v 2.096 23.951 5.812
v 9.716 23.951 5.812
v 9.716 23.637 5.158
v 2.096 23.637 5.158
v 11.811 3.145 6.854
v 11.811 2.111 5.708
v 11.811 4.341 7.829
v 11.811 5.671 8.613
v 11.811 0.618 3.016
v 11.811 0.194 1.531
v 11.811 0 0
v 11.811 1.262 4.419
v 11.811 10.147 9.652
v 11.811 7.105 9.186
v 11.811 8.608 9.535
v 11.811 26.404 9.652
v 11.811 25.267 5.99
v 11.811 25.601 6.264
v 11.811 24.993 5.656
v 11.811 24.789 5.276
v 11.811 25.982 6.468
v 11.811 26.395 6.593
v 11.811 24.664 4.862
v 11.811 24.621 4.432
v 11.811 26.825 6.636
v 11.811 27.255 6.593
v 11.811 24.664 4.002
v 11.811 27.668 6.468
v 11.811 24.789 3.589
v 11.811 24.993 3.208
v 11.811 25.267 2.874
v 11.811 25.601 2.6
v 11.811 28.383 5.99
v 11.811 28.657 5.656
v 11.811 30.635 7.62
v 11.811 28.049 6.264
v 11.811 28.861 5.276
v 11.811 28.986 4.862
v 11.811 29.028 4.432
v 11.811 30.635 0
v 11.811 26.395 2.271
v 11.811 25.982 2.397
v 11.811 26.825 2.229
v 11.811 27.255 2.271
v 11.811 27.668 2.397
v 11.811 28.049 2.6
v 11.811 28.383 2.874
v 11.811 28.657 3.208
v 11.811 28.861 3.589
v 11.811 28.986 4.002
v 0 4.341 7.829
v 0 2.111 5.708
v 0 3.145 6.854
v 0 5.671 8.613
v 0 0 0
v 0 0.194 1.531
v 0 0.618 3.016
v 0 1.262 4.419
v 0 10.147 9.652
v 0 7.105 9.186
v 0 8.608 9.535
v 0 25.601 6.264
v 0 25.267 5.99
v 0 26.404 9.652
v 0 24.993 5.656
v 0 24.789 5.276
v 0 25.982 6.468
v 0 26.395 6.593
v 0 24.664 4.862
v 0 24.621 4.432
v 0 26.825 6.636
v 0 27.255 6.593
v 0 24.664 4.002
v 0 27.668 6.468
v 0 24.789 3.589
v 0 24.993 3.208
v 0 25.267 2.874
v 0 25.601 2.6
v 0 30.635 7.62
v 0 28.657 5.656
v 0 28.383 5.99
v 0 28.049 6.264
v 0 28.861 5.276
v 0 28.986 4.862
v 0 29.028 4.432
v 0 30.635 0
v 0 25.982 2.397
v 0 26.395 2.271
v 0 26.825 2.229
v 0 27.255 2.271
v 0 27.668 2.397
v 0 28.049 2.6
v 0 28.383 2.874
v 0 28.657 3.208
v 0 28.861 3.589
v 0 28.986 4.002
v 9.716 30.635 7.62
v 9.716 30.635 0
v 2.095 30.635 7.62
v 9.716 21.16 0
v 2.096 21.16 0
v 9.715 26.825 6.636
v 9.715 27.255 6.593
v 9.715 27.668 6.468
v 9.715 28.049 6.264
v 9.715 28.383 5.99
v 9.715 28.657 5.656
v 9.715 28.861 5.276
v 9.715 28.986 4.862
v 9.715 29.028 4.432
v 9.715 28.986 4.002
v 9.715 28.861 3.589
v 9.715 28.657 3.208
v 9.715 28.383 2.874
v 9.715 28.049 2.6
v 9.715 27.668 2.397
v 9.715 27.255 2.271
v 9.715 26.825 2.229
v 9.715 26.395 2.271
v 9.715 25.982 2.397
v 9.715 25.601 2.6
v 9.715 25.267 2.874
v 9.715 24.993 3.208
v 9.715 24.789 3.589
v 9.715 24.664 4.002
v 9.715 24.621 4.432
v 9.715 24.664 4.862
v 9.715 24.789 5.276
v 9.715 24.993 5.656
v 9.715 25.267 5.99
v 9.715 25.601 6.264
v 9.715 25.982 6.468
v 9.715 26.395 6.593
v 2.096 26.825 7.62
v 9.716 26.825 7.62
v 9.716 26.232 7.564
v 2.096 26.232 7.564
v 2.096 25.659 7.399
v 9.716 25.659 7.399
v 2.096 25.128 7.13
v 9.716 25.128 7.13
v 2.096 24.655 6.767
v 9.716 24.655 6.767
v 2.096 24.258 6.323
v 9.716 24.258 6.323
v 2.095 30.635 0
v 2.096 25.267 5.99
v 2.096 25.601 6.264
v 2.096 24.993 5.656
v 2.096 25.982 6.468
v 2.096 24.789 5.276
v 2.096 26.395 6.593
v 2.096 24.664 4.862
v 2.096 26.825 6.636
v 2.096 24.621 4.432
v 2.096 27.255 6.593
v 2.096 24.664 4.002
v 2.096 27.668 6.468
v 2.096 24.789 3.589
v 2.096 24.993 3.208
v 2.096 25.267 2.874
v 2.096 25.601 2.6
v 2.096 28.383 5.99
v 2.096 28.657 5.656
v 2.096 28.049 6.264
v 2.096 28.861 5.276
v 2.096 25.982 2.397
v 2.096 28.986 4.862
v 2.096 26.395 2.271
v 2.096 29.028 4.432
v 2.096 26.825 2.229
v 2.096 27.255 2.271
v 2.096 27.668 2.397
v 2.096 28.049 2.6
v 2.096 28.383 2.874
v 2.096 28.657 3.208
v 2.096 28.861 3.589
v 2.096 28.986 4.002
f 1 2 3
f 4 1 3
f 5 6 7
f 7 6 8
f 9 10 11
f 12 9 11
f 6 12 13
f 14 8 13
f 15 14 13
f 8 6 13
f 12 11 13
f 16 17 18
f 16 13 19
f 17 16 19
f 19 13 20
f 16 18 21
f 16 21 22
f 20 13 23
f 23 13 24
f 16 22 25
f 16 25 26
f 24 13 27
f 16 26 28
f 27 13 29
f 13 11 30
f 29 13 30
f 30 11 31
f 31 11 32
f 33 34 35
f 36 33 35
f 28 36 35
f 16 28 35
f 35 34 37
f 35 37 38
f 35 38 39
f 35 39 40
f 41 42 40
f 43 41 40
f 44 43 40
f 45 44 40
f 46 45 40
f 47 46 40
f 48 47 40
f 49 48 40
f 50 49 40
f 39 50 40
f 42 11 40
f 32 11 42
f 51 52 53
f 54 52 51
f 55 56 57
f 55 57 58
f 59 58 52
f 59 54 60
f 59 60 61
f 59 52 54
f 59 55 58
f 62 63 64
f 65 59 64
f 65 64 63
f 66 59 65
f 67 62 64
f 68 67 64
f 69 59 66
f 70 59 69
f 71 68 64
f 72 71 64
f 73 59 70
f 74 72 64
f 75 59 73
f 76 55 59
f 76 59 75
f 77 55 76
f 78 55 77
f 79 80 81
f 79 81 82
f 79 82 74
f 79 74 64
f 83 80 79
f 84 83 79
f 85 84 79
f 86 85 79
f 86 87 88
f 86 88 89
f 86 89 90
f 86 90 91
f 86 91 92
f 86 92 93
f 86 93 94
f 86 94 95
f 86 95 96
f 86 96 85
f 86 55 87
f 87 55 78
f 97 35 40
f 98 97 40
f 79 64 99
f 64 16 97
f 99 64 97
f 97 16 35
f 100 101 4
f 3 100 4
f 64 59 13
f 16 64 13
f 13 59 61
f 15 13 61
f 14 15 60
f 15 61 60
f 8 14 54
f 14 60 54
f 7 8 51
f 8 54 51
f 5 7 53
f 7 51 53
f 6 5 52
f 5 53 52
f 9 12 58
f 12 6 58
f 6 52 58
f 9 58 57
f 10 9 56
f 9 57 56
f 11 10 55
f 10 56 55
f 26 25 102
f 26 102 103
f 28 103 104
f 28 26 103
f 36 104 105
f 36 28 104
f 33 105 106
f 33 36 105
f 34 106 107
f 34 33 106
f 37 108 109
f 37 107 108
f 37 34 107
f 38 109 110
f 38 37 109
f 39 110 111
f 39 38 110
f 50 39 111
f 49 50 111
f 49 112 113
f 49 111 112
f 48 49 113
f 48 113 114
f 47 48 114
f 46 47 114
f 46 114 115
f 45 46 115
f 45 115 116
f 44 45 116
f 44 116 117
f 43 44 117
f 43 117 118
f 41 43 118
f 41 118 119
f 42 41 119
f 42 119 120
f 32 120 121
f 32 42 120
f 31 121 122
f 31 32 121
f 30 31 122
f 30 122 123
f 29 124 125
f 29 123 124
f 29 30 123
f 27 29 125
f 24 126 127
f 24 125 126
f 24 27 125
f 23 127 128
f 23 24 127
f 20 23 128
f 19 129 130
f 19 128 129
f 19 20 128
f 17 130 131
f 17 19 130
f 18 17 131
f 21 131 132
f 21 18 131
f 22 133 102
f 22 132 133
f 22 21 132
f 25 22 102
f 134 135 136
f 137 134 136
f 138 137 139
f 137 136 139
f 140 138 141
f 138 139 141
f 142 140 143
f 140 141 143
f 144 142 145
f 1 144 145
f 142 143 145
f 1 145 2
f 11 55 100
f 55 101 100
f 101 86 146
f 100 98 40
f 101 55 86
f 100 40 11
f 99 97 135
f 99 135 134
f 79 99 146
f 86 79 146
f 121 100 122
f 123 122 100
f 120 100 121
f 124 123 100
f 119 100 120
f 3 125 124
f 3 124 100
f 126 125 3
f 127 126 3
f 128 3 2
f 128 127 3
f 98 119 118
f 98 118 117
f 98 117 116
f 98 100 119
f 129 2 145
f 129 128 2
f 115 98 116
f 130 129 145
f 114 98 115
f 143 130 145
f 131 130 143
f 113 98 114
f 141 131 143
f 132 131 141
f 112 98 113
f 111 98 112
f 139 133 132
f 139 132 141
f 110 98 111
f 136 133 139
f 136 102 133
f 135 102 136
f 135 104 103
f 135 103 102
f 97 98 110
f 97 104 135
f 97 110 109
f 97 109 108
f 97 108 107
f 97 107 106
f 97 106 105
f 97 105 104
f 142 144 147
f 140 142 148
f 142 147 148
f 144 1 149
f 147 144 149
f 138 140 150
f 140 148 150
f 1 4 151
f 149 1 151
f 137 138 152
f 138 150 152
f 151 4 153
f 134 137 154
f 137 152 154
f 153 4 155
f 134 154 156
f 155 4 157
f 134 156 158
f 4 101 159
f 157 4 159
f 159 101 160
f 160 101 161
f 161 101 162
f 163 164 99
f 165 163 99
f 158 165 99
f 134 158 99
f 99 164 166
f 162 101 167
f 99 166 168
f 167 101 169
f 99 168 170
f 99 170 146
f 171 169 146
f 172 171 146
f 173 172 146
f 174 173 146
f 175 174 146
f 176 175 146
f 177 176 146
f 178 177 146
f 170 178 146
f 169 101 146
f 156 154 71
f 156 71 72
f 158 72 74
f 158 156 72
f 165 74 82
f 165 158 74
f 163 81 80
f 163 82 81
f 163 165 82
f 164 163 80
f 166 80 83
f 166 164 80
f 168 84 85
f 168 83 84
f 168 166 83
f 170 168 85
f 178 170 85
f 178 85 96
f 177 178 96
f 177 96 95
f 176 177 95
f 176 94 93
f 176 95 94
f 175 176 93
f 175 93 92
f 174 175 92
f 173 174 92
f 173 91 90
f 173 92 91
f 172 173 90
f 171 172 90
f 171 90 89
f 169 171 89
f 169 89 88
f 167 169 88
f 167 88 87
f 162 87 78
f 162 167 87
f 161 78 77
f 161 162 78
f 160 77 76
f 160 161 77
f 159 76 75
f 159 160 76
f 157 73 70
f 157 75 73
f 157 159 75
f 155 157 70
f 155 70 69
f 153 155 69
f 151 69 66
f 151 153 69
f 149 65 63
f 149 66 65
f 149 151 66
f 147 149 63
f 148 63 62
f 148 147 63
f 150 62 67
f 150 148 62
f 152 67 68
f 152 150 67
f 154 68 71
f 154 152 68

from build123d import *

# Parameters (mm, degrees)
SKETCH1_W               = 11.811
SKETCH1_H               = 45.98924
BOSS_EXTRUDE1_DEPTH     = 9.652
FILLET5_R               = 4.826
SKETCH2_W               = 7.62
SKETCH2_H               = 22.352
CUT_EXTRUDE1_DEPTH      = 7.62
CUT_EXTRUDE2_DEPTH      = 49.452771033
CUT_EXTRUDE2_DEPTH_BACK = 49.452771033
SKETCH3_R               = 2.20345
FILLET4_R               = 4.826
FILLET6_R               = 10.16
CUT_EXTRUDE3_DEPTH      = 49.452771033
CUT_EXTRUDE4_DEPTH      = 7.62
BOSS_EXTRUDE2_DEPTH     = 7.62


with BuildPart() as part:
    # Sketch1 → Boss-Extrude1 (new body)
    with BuildSketch(Plane.XY):
        with Locations((5.9055, 22.99462)):
            Rectangle(SKETCH1_W, SKETCH1_H)
    extrude(amount=BOSS_EXTRUDE1_DEPTH)

    # Fillet5
    fillet5_edges = [part.edges().sort_by_distance(p)[0] for p in [
        (5.9055, 45.98924, 0),
    ]]
    fillet(fillet5_edges, radius=FILLET5_R)

    # Sketch2 → Cut-Extrude1 (cut)
    with BuildSketch(Plane(origin=(0, 0, 0), x_dir=(-1, 0, 0), z_dir=(0, 0, -1))):
        with Locations((-5.9055, 34.81324)):
            Rectangle(SKETCH2_W, SKETCH2_H)
    extrude(amount=-CUT_EXTRUDE1_DEPTH, mode=Mode.SUBTRACT)

    # Sketch3 → Cut-Extrude2 (cut, two sides: drawn at the far end of the back side and taken through both)
    with BuildSketch(Plane.ZY.offset(-CUT_EXTRUDE2_DEPTH_BACK)):
        with Locations((4.4323, 26.82494)):
            Circle(SKETCH3_R)
    extrude(amount=CUT_EXTRUDE2_DEPTH + CUT_EXTRUDE2_DEPTH_BACK, mode=Mode.SUBTRACT)

    # Fillet4
    # the kernel refuses this fillet: 4.826 mm, written as the material it takes off along each edge
    with BuildSketch(Plane(origin=(23.876, 45.98924, 9.652), x_dir=(0, 0, -1), z_dir=(-1, 0, 0))) as fillet4_piece_1:
        with BuildLine():
            CenterArc((FILLET4_R, FILLET4_R), FILLET4_R, 180, 90)
            Line((0, FILLET4_R), (0, 0))
            Line((0, 0), (FILLET4_R, 0))
        make_face()
    extrude(amount=35.941, mode=Mode.SUBTRACT)

    # Fillet6
    # the kernel refuses this fillet: 10.16 mm, written as the material it takes off along each edge
    with BuildSketch(Plane(origin=(-25.368230131, 0, 9.652), x_dir=(0, 1, 0), z_dir=(1, 0, 0))) as fillet6_piece_1:
        with BuildLine():
            CenterArc((10.147292053, -10.16), FILLET6_R, 90, 87.134016017)
            Line((0, -9.652), (-0.202945841, -9.64184))
            ThreePointArc((-0.202945841, -9.64184), (-0.2032, -4.826), (-0.2032, 0))
            Line((-0.2032, 0), (0, 0.2032))
            Line((0, 0.2032), (10.147292053, 0.2032))
            Line((10.147292053, 0.2032), (10.147292053, 0))
        make_face()
    extrude(amount=62.547460263, mode=Mode.SUBTRACT)

    # Sketch4 → Cut-Extrude3 (cut, through all)
    with BuildSketch(Plane(origin=(11.811, 0, 0), x_dir=(0, 0, -1), z_dir=(1, 0, 0))):
        Polygon((-9.652, 26.403813088), (-7.62, 30.63494), (0, 30.63494), (0, 45.98924), (-9.652, 45.98924), align=None)
    extrude(amount=-CUT_EXTRUDE3_DEPTH, mode=Mode.SUBTRACT)

    # Sketch5 → Cut-Extrude4 (cut)
    with BuildSketch(Plane.ZY.offset(-9.7155)):
        Polygon((0, 21.160076085), (5.158068358, 23.63724), (0, 23.63724), align=None)
    extrude(amount=CUT_EXTRUDE4_DEPTH, mode=Mode.SUBTRACT)

    # Sketch5<3> → Boss-Extrude2 (add)
    with BuildSketch(Plane.ZY.offset(-9.7155)):
        with BuildLine():
            Line((5.812301369, 23.951435604), (5.158068358, 23.63724))
            Line((5.158068358, 23.63724), (7.62, 23.63724))
            Line((7.62, 23.63724), (7.62, 26.82494))
            ThreePointArc((7.62, 26.82494), (7.130490287, 25.127530072), (5.812301369, 23.951435604))
        make_face()
    extrude(amount=BOSS_EXTRUDE2_DEPTH)


solid = part.part
